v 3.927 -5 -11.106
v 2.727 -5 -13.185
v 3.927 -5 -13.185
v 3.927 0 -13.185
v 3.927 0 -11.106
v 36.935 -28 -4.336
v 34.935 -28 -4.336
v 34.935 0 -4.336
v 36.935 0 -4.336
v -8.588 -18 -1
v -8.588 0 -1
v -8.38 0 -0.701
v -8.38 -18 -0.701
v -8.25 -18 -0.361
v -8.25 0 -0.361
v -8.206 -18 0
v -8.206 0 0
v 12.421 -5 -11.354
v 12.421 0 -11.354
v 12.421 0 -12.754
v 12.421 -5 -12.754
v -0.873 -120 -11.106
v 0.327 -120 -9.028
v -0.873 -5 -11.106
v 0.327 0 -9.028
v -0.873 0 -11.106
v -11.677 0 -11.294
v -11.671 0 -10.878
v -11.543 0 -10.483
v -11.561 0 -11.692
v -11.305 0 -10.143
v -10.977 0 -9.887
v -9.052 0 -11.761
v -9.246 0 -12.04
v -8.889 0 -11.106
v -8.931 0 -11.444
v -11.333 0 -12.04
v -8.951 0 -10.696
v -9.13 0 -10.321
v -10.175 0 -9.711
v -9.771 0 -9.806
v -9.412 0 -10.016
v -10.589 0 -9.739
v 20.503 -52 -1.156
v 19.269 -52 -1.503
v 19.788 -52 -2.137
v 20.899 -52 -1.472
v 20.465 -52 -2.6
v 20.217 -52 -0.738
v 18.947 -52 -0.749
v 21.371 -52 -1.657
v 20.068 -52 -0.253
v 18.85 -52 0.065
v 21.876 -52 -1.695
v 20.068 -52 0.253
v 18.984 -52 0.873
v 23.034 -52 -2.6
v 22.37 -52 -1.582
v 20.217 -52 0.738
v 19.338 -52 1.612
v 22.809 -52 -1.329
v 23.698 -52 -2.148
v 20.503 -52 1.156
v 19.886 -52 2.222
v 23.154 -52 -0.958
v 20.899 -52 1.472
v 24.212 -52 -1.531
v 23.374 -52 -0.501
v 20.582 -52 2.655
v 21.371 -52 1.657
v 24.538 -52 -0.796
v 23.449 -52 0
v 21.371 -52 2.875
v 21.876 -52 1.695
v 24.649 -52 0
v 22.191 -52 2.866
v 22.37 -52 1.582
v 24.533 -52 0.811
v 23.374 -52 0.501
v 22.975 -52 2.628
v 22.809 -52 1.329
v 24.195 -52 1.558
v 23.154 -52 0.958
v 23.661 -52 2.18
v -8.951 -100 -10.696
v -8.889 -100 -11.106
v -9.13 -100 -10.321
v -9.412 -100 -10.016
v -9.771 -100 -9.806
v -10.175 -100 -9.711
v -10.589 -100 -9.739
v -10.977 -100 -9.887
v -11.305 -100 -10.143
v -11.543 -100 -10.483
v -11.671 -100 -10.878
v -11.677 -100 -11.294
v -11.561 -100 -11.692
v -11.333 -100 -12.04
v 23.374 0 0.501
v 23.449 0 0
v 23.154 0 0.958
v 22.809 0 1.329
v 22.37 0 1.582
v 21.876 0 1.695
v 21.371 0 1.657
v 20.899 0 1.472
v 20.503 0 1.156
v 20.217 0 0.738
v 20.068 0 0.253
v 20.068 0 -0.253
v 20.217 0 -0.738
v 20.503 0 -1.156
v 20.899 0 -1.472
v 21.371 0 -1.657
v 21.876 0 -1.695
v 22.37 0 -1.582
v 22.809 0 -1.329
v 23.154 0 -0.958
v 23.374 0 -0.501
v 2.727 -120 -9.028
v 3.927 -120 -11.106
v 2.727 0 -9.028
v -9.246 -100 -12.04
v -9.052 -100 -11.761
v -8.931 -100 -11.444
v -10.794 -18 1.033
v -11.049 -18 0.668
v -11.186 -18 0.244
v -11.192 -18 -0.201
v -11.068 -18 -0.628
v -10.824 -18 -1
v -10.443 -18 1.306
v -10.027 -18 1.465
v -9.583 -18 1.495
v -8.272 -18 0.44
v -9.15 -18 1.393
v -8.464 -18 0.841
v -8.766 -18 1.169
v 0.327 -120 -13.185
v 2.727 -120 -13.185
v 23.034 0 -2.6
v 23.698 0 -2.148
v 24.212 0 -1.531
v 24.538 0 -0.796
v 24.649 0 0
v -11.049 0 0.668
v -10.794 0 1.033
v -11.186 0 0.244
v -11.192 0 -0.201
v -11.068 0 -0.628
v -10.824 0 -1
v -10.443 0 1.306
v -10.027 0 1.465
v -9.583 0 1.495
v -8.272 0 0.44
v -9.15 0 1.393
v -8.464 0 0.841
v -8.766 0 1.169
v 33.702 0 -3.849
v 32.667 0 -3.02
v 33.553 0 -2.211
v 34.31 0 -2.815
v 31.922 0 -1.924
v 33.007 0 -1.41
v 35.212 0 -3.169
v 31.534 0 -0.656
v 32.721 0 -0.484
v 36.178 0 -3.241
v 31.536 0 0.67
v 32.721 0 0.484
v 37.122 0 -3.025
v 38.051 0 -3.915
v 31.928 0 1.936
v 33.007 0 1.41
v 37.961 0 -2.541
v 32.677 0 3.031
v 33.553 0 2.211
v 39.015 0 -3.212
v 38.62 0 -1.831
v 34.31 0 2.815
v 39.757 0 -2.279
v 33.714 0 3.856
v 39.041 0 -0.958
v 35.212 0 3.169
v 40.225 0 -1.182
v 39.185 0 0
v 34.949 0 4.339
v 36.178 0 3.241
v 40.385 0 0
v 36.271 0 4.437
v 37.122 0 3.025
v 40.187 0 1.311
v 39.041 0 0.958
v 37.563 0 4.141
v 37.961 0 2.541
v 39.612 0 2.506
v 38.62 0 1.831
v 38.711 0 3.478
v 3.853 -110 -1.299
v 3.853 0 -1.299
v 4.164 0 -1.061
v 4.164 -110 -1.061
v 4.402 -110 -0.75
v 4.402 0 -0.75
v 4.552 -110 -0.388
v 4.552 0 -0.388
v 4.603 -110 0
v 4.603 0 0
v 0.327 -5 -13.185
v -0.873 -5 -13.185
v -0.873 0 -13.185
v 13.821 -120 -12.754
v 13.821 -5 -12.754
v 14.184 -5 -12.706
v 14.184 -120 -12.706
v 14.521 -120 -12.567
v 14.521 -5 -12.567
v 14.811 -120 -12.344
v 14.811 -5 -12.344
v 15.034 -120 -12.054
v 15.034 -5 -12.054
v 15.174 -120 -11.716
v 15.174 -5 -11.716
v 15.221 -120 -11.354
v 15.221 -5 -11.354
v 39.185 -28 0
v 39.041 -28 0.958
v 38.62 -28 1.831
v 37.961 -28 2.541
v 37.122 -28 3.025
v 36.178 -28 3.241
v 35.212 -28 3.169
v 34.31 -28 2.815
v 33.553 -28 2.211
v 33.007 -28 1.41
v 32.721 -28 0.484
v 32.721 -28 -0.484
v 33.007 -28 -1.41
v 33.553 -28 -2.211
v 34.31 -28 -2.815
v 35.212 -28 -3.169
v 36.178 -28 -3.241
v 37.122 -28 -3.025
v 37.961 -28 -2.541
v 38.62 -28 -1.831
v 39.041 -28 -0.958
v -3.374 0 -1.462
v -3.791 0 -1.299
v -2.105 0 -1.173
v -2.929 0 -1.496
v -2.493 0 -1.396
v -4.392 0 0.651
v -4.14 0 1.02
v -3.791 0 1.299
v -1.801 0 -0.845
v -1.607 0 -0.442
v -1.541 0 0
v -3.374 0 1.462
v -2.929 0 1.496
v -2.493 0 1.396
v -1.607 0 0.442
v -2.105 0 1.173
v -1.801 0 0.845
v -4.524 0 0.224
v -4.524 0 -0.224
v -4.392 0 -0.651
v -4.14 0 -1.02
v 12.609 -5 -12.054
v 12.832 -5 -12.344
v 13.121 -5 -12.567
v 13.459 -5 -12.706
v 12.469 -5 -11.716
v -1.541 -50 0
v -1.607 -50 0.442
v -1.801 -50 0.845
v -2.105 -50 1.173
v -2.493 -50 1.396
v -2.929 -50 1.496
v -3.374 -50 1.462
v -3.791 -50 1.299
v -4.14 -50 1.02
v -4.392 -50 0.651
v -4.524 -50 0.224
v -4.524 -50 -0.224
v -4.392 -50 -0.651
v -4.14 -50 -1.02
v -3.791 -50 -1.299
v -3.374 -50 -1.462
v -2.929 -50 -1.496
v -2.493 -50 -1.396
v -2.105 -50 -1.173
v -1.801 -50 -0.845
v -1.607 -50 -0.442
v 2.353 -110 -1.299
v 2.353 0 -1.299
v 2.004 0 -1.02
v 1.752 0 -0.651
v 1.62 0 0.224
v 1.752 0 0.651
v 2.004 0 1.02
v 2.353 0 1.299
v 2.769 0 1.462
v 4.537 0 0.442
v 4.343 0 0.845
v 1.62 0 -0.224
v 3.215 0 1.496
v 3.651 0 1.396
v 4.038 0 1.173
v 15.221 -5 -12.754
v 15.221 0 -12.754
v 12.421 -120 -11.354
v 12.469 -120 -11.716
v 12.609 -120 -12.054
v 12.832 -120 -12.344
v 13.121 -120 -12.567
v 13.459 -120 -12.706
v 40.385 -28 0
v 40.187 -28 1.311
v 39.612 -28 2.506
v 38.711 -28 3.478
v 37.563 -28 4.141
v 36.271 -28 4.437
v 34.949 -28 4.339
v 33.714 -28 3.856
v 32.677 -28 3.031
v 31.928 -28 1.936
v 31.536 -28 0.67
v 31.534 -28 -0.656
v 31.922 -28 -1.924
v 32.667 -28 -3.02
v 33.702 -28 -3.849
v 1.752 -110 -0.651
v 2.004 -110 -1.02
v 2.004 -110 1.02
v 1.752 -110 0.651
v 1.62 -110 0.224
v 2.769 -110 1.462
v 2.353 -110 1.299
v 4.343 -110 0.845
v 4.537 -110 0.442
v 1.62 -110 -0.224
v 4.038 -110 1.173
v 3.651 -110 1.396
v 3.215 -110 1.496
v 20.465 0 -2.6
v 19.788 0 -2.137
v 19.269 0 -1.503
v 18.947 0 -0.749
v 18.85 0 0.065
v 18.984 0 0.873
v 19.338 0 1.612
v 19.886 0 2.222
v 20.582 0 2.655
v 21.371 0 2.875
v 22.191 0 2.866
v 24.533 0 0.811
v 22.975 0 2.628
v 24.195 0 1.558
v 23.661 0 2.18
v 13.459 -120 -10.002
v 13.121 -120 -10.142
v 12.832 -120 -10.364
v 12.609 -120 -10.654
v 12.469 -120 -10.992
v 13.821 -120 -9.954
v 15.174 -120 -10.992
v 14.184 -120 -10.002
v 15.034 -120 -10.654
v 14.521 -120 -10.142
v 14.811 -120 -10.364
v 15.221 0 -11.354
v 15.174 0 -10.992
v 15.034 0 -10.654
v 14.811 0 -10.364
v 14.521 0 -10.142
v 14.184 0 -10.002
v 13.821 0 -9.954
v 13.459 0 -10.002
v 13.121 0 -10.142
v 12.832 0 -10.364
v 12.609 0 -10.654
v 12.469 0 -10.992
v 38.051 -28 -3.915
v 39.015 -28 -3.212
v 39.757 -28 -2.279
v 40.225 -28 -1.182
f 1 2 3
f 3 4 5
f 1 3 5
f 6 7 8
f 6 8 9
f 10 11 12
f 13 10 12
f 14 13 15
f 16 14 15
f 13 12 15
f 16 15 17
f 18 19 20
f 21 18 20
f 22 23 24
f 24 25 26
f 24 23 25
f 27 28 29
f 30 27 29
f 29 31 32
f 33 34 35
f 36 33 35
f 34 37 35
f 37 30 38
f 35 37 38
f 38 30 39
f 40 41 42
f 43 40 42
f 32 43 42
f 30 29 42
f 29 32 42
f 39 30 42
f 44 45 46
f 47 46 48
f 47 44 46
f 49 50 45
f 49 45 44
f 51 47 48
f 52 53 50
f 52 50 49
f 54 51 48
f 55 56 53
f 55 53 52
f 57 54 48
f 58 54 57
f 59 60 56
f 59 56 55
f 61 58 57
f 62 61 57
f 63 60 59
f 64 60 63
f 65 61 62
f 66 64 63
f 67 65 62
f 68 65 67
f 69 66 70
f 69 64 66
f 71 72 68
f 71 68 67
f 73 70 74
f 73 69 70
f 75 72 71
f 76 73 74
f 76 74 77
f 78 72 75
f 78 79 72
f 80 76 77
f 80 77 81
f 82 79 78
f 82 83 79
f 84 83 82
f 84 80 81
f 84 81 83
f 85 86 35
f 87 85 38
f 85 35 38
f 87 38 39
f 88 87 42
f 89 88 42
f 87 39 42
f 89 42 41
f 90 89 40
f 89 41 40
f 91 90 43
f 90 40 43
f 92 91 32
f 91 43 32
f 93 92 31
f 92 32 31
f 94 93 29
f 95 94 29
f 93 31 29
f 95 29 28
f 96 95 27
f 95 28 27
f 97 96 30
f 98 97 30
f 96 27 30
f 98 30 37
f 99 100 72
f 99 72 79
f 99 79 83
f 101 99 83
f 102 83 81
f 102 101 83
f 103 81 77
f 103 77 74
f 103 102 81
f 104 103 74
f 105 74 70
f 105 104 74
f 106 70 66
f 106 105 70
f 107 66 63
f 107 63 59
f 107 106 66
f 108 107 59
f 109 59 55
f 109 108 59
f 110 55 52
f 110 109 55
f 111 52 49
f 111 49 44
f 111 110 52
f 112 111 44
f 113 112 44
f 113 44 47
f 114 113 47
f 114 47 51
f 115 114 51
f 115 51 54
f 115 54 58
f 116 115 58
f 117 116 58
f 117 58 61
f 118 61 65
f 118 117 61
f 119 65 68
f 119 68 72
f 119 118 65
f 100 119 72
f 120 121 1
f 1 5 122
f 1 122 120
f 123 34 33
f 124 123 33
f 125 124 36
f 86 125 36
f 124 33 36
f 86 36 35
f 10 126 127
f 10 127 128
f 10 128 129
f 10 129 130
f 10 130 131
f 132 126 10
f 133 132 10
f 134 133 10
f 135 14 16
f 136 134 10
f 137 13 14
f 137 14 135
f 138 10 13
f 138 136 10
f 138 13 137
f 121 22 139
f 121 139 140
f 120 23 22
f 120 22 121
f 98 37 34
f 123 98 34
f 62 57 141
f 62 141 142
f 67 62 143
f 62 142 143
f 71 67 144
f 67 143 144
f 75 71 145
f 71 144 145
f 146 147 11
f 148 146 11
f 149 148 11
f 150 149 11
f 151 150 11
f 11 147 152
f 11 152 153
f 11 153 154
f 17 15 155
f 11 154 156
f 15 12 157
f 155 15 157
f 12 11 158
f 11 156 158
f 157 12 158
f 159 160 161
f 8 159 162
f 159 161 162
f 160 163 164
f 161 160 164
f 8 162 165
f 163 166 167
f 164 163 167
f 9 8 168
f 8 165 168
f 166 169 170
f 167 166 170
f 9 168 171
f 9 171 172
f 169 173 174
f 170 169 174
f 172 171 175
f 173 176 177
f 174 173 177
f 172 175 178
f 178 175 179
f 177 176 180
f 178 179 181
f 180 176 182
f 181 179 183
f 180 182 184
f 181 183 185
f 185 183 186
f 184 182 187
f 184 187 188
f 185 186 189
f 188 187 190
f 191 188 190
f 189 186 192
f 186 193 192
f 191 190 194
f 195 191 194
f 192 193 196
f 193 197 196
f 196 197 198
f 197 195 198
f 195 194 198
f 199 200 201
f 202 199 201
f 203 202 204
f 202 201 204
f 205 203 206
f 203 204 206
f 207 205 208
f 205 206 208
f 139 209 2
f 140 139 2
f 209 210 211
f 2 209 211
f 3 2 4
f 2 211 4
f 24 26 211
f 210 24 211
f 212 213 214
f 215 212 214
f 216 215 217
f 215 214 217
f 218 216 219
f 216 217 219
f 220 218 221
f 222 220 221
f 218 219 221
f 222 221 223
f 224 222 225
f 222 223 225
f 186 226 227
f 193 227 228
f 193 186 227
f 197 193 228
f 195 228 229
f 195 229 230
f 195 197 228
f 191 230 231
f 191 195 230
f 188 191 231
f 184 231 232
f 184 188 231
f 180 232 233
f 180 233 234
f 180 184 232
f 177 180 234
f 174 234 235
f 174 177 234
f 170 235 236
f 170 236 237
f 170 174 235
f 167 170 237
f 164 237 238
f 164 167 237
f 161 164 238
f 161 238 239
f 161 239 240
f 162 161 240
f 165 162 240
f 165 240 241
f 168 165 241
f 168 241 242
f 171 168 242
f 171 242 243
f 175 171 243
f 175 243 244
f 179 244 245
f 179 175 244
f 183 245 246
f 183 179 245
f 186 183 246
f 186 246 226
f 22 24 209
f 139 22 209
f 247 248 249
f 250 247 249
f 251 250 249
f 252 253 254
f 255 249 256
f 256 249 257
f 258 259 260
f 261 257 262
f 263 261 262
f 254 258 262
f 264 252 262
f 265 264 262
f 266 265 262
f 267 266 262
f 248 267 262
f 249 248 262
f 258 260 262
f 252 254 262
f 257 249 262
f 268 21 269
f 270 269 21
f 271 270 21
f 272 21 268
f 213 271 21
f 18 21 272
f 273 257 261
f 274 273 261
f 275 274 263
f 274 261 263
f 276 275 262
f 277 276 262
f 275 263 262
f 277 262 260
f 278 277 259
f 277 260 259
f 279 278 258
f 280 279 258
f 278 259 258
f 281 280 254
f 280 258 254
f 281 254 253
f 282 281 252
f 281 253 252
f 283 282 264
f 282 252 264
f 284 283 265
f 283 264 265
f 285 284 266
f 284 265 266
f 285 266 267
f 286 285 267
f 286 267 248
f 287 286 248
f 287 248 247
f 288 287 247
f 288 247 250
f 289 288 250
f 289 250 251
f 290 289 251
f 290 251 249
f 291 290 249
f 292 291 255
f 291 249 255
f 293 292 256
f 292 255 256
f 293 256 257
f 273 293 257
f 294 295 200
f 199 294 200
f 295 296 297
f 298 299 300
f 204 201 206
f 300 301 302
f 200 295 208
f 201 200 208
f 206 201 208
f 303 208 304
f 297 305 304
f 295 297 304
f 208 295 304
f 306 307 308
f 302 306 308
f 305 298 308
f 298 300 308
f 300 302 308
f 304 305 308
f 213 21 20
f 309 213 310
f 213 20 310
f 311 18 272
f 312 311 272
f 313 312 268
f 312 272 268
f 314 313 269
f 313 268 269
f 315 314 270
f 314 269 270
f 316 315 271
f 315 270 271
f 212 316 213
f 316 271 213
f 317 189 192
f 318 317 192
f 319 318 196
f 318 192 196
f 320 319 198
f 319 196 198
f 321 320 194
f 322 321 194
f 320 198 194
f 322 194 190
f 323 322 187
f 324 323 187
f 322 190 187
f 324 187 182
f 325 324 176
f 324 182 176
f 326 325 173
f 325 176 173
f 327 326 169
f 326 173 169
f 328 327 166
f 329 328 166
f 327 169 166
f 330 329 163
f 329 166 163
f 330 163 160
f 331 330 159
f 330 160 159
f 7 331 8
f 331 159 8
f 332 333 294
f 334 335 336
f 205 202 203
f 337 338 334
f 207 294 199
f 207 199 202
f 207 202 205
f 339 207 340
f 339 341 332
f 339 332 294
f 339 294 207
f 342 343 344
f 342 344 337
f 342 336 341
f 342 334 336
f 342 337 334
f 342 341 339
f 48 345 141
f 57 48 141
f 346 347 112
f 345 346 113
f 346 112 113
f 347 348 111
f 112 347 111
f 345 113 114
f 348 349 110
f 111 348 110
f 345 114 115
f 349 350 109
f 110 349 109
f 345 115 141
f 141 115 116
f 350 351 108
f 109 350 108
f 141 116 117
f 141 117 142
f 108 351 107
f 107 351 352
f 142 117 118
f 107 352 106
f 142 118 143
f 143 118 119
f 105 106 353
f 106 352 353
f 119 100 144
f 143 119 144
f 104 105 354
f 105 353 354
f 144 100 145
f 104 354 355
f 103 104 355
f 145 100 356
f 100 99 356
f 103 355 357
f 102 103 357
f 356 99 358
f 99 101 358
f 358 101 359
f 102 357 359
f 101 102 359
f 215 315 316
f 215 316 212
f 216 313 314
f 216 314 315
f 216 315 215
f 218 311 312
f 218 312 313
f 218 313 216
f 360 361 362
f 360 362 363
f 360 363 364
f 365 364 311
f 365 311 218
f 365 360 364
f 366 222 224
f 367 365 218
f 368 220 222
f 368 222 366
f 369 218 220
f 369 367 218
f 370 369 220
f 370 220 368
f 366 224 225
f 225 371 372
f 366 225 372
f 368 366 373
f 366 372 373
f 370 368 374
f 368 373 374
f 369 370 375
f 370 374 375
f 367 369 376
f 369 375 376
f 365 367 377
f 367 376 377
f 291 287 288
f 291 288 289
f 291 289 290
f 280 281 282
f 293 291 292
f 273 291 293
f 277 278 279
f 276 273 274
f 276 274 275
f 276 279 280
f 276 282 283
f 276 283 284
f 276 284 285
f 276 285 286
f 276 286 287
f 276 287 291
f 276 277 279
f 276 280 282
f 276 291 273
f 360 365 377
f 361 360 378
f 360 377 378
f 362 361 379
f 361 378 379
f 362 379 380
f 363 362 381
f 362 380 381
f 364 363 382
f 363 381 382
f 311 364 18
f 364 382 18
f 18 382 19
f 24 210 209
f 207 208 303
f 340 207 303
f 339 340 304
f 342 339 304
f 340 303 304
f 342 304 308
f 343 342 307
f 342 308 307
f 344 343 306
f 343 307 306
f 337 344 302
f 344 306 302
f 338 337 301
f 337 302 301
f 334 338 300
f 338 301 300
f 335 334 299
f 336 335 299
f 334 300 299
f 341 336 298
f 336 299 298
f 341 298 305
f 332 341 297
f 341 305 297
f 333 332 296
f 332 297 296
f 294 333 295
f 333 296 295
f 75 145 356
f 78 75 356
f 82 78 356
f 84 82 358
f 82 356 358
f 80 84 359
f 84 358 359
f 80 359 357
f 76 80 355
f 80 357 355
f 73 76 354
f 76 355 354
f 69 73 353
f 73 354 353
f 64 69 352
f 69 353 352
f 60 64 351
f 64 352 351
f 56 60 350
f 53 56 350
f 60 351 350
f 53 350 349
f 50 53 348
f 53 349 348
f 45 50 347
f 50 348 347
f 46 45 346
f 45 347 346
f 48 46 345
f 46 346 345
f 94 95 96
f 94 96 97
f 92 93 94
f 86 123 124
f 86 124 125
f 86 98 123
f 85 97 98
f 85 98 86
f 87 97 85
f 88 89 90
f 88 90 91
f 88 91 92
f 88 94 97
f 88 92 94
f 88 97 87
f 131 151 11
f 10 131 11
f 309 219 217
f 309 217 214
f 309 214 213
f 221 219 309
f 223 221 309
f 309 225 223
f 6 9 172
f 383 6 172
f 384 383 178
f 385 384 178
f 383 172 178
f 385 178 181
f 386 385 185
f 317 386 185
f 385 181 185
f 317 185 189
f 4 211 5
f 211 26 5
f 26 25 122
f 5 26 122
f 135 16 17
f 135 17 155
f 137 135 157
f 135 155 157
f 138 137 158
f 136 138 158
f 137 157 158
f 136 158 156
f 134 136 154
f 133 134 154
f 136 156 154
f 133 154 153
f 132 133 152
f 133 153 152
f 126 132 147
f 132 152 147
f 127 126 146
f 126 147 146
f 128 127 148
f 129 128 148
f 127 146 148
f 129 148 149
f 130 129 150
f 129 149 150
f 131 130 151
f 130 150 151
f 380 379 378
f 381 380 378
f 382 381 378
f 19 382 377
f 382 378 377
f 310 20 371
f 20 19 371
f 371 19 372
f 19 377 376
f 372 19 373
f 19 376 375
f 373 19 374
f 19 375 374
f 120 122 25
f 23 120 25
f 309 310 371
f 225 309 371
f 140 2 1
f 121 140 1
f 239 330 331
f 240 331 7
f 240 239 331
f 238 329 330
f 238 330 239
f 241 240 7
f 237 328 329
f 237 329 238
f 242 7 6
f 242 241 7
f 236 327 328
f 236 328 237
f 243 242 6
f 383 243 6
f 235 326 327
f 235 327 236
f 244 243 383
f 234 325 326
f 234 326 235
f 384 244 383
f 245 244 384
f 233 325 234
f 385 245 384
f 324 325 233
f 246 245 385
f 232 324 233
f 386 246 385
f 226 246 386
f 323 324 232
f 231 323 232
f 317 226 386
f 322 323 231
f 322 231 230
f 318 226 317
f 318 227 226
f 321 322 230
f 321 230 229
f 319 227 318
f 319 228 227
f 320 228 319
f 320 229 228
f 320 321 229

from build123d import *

# Parameters (mm, degrees)
F1_DEPTH = 18
F0_R     = 1.5
F2_DEPTH = 50
F3_DEPTH = 110
F4_DEPTH = 100
F0_R_2   = 1.7
F5_DEPTH = 52
F0_R_3   = 3.25
F6_DEPTH = 28
F7_DEPTH = 120
F8_DEPTH = 5
F9_DEPTH = 5


# Not quite as in the source:
# - a feature names something its author has since deleted; it is built from what else it names


with BuildPart() as f1:
    # F0 (on Front) → F1 (new body)
    with BuildSketch(Plane.XZ):
        with BuildLine():
            ThreePointArc((-8.5876567433, -1), (-8.3044321936, -0.5352331347), (-8.205690732, 0))
            ThreePointArc((-8.205690732, 0), (-10.2409238667, 1.4012585384), (-10.8237247208, -1))
            Line((-10.8237247208, -1), (-8.5876567433, -1))
        make_face()
    extrude(amount=F1_DEPTH)


with BuildPart() as f2:
    # F0 (on Front) → F2 (new body)
    with BuildSketch(Plane.XZ):
        with Locations((-3.0406215228, 0)):
            Circle(F0_R)
    extrude(amount=F2_DEPTH)


with BuildPart() as f3:
    # F0 (on Front) → F3 (new body)
    with BuildSketch(Plane.XZ):
        with BuildLine():
            ThreePointArc((4.6031738035, 0), (2.3531738035, 1.2990381057), (2.3531738035, -1.2990381057))
            Line((2.3531738035, -1.2990381057), (3.8531738035, -1.2990381057))
            ThreePointArc((3.8531738035, -1.2990381057), (4.4022119092, -0.75), (4.6031738035, 0))
        make_face()
    extrude(amount=F3_DEPTH)


with BuildPart() as f4:
    # F0 (on Front) → F4 (new body)
    with BuildSketch(Plane.XZ):
        with BuildLine():
            ThreePointArc((-9.2458325086, -12.0397212359), (-8.9814895955, -11.6059388283), (-8.8893308981, -11.1063879026))
            ThreePointArc((-8.8893308981, -11.1063879026), (-10.7888818238, -9.7985466), (-11.3328292876, -12.0397212359))
            Line((-11.3328292876, -12.0397212359), (-9.2458325086, -12.0397212359))
        make_face()
    extrude(amount=F4_DEPTH)


with BuildPart() as f5:
    # F0 (on Front) → F5 (new body)
    with BuildSketch(Plane.XZ):
        with BuildLine():
            ThreePointArc((23.0335708203, -2.6), (24.2122890699, -1.5305036021), (24.6490475625, 0))
            ThreePointArc((24.6490475625, 0), (20.2185439604, 2.4632415074), (20.4645243046, -2.6))
            Line((20.4645243046, -2.6), (23.0335708203, -2.6))
        make_face()
        with Locations((21.7490475625, 0)):
            Circle(F0_R_2, mode=Mode.SUBTRACT)
    extrude(amount=F5_DEPTH)


with BuildPart() as f6:
    # F0 (on Front) → F6 (new body)
    with BuildSketch(Plane.XZ):
        with BuildLine():
            ThreePointArc((36.9349649165, -4.3361849592), (39.4172414707, -2.7706046272), (40.3849649165, 0))
            ThreePointArc((40.3849649165, 0), (33.1643602893, 3.4822765542), (34.9349649165, -4.3361849592))
            Line((34.9349649165, -4.3361849592), (36.9349649165, -4.3361849592))
        make_face()
        with Locations((35.9349649165, 0)):
            Circle(F0_R_3, mode=Mode.SUBTRACT)
    extrude(amount=F6_DEPTH)


with BuildPart() as f7:
    # F0 (on Front) → F7 (new body)
    with BuildSketch(Plane.XZ):
        with BuildLine():
            ThreePointArc((13.8214863837, -12.754113929), (14.8114358773, -12.3440634226), (15.2214863837, -11.354113929))
            ThreePointArc((15.2214863837, -11.354113929), (14.8114358773, -10.3641644353), (13.8214863837, -9.954113929))
            ThreePointArc((13.8214863837, -9.954113929), (12.83153689, -10.3641644353), (12.4214863837, -11.354113929))
            ThreePointArc((12.4214863837, -11.354113929), (12.83153689, -12.3440634226), (13.8214863837, -12.754113929))
        make_face()
    extrude(amount=F7_DEPTH)

    # F0 (on Front) → F9 (join)
    with BuildSketch(Plane.XZ):
        with BuildLine():
            Line((12.4214863837, -12.754113929), (13.8214863837, -12.754113929))
            ThreePointArc((13.8214863837, -12.754113929), (12.83153689, -12.3440634226), (12.4214863837, -11.354113929))
            Line((12.4214863837, -11.354113929), (12.4214863837, -12.754113929))
        make_face()
        with BuildLine():
            Line((15.2214863837, -12.754113929), (15.2214863837, -11.354113929))
            ThreePointArc((15.2214863837, -11.354113929), (14.8114358773, -12.3440634226), (13.8214863837, -12.754113929))
            Line((13.8214863837, -12.754113929), (15.2214863837, -12.754113929))
        make_face()
    extrude(amount=F9_DEPTH)


with BuildPart() as f7b:
    # F0 (on Front) → F7, piece 2 (new body)
    with BuildSketch(Plane.XZ):
        Polygon((2.7269763106, -13.1848488717), (3.9269763106, -11.1063879026), (2.7269763106, -9.0279269335), (0.3269763106, -9.0279269335), (-0.8730236894, -11.1063879026), (0.3269763106, -13.1848488717), align=None)
    extrude(amount=F7_DEPTH)

    # F0 (on Front) → F8 (join)
    with BuildSketch(Plane.XZ):
        with BuildLine():
            Line((-0.8730236894, -13.1848488717), (0.3269763106, -13.1848488717))
            ThreePointArc((0.3269763106, -13.1848488717), (-0.5514846585, -12.3063879026), (-0.8730236894, -11.1063879026))
            Line((-0.8730236894, -11.1063879026), (-0.8730236894, -13.1848488717))
        make_face()
        with BuildLine():
            Line((3.9269763106, -13.1848488717), (3.9269763106, -11.1063879026))
            ThreePointArc((3.9269763106, -11.1063879026), (3.6054372797, -12.3063879026), (2.7269763106, -13.1848488717))
            Line((2.7269763106, -13.1848488717), (3.9269763106, -13.1848488717))
        make_face()
        with BuildLine():
            ThreePointArc((2.7269763106, -13.1848488717), (3.6054372797, -12.3063879026), (3.9269763106, -11.1063879026))
            Line((3.9269763106, -11.1063879026), (2.7269763106, -13.1848488717))
        make_face()
        with BuildLine():
            ThreePointArc((-0.8730236894, -11.1063879026), (-0.5514846585, -12.3063879026), (0.3269763106, -13.1848488717))
            Line((0.3269763106, -13.1848488717), (-0.8730236894, -11.1063879026))
        make_face()
    extrude(amount=F8_DEPTH)


solid = Compound([f1.part, f2.part, f3.part, f4.part, f5.part, f6.part, f7.part, f7b.part])
